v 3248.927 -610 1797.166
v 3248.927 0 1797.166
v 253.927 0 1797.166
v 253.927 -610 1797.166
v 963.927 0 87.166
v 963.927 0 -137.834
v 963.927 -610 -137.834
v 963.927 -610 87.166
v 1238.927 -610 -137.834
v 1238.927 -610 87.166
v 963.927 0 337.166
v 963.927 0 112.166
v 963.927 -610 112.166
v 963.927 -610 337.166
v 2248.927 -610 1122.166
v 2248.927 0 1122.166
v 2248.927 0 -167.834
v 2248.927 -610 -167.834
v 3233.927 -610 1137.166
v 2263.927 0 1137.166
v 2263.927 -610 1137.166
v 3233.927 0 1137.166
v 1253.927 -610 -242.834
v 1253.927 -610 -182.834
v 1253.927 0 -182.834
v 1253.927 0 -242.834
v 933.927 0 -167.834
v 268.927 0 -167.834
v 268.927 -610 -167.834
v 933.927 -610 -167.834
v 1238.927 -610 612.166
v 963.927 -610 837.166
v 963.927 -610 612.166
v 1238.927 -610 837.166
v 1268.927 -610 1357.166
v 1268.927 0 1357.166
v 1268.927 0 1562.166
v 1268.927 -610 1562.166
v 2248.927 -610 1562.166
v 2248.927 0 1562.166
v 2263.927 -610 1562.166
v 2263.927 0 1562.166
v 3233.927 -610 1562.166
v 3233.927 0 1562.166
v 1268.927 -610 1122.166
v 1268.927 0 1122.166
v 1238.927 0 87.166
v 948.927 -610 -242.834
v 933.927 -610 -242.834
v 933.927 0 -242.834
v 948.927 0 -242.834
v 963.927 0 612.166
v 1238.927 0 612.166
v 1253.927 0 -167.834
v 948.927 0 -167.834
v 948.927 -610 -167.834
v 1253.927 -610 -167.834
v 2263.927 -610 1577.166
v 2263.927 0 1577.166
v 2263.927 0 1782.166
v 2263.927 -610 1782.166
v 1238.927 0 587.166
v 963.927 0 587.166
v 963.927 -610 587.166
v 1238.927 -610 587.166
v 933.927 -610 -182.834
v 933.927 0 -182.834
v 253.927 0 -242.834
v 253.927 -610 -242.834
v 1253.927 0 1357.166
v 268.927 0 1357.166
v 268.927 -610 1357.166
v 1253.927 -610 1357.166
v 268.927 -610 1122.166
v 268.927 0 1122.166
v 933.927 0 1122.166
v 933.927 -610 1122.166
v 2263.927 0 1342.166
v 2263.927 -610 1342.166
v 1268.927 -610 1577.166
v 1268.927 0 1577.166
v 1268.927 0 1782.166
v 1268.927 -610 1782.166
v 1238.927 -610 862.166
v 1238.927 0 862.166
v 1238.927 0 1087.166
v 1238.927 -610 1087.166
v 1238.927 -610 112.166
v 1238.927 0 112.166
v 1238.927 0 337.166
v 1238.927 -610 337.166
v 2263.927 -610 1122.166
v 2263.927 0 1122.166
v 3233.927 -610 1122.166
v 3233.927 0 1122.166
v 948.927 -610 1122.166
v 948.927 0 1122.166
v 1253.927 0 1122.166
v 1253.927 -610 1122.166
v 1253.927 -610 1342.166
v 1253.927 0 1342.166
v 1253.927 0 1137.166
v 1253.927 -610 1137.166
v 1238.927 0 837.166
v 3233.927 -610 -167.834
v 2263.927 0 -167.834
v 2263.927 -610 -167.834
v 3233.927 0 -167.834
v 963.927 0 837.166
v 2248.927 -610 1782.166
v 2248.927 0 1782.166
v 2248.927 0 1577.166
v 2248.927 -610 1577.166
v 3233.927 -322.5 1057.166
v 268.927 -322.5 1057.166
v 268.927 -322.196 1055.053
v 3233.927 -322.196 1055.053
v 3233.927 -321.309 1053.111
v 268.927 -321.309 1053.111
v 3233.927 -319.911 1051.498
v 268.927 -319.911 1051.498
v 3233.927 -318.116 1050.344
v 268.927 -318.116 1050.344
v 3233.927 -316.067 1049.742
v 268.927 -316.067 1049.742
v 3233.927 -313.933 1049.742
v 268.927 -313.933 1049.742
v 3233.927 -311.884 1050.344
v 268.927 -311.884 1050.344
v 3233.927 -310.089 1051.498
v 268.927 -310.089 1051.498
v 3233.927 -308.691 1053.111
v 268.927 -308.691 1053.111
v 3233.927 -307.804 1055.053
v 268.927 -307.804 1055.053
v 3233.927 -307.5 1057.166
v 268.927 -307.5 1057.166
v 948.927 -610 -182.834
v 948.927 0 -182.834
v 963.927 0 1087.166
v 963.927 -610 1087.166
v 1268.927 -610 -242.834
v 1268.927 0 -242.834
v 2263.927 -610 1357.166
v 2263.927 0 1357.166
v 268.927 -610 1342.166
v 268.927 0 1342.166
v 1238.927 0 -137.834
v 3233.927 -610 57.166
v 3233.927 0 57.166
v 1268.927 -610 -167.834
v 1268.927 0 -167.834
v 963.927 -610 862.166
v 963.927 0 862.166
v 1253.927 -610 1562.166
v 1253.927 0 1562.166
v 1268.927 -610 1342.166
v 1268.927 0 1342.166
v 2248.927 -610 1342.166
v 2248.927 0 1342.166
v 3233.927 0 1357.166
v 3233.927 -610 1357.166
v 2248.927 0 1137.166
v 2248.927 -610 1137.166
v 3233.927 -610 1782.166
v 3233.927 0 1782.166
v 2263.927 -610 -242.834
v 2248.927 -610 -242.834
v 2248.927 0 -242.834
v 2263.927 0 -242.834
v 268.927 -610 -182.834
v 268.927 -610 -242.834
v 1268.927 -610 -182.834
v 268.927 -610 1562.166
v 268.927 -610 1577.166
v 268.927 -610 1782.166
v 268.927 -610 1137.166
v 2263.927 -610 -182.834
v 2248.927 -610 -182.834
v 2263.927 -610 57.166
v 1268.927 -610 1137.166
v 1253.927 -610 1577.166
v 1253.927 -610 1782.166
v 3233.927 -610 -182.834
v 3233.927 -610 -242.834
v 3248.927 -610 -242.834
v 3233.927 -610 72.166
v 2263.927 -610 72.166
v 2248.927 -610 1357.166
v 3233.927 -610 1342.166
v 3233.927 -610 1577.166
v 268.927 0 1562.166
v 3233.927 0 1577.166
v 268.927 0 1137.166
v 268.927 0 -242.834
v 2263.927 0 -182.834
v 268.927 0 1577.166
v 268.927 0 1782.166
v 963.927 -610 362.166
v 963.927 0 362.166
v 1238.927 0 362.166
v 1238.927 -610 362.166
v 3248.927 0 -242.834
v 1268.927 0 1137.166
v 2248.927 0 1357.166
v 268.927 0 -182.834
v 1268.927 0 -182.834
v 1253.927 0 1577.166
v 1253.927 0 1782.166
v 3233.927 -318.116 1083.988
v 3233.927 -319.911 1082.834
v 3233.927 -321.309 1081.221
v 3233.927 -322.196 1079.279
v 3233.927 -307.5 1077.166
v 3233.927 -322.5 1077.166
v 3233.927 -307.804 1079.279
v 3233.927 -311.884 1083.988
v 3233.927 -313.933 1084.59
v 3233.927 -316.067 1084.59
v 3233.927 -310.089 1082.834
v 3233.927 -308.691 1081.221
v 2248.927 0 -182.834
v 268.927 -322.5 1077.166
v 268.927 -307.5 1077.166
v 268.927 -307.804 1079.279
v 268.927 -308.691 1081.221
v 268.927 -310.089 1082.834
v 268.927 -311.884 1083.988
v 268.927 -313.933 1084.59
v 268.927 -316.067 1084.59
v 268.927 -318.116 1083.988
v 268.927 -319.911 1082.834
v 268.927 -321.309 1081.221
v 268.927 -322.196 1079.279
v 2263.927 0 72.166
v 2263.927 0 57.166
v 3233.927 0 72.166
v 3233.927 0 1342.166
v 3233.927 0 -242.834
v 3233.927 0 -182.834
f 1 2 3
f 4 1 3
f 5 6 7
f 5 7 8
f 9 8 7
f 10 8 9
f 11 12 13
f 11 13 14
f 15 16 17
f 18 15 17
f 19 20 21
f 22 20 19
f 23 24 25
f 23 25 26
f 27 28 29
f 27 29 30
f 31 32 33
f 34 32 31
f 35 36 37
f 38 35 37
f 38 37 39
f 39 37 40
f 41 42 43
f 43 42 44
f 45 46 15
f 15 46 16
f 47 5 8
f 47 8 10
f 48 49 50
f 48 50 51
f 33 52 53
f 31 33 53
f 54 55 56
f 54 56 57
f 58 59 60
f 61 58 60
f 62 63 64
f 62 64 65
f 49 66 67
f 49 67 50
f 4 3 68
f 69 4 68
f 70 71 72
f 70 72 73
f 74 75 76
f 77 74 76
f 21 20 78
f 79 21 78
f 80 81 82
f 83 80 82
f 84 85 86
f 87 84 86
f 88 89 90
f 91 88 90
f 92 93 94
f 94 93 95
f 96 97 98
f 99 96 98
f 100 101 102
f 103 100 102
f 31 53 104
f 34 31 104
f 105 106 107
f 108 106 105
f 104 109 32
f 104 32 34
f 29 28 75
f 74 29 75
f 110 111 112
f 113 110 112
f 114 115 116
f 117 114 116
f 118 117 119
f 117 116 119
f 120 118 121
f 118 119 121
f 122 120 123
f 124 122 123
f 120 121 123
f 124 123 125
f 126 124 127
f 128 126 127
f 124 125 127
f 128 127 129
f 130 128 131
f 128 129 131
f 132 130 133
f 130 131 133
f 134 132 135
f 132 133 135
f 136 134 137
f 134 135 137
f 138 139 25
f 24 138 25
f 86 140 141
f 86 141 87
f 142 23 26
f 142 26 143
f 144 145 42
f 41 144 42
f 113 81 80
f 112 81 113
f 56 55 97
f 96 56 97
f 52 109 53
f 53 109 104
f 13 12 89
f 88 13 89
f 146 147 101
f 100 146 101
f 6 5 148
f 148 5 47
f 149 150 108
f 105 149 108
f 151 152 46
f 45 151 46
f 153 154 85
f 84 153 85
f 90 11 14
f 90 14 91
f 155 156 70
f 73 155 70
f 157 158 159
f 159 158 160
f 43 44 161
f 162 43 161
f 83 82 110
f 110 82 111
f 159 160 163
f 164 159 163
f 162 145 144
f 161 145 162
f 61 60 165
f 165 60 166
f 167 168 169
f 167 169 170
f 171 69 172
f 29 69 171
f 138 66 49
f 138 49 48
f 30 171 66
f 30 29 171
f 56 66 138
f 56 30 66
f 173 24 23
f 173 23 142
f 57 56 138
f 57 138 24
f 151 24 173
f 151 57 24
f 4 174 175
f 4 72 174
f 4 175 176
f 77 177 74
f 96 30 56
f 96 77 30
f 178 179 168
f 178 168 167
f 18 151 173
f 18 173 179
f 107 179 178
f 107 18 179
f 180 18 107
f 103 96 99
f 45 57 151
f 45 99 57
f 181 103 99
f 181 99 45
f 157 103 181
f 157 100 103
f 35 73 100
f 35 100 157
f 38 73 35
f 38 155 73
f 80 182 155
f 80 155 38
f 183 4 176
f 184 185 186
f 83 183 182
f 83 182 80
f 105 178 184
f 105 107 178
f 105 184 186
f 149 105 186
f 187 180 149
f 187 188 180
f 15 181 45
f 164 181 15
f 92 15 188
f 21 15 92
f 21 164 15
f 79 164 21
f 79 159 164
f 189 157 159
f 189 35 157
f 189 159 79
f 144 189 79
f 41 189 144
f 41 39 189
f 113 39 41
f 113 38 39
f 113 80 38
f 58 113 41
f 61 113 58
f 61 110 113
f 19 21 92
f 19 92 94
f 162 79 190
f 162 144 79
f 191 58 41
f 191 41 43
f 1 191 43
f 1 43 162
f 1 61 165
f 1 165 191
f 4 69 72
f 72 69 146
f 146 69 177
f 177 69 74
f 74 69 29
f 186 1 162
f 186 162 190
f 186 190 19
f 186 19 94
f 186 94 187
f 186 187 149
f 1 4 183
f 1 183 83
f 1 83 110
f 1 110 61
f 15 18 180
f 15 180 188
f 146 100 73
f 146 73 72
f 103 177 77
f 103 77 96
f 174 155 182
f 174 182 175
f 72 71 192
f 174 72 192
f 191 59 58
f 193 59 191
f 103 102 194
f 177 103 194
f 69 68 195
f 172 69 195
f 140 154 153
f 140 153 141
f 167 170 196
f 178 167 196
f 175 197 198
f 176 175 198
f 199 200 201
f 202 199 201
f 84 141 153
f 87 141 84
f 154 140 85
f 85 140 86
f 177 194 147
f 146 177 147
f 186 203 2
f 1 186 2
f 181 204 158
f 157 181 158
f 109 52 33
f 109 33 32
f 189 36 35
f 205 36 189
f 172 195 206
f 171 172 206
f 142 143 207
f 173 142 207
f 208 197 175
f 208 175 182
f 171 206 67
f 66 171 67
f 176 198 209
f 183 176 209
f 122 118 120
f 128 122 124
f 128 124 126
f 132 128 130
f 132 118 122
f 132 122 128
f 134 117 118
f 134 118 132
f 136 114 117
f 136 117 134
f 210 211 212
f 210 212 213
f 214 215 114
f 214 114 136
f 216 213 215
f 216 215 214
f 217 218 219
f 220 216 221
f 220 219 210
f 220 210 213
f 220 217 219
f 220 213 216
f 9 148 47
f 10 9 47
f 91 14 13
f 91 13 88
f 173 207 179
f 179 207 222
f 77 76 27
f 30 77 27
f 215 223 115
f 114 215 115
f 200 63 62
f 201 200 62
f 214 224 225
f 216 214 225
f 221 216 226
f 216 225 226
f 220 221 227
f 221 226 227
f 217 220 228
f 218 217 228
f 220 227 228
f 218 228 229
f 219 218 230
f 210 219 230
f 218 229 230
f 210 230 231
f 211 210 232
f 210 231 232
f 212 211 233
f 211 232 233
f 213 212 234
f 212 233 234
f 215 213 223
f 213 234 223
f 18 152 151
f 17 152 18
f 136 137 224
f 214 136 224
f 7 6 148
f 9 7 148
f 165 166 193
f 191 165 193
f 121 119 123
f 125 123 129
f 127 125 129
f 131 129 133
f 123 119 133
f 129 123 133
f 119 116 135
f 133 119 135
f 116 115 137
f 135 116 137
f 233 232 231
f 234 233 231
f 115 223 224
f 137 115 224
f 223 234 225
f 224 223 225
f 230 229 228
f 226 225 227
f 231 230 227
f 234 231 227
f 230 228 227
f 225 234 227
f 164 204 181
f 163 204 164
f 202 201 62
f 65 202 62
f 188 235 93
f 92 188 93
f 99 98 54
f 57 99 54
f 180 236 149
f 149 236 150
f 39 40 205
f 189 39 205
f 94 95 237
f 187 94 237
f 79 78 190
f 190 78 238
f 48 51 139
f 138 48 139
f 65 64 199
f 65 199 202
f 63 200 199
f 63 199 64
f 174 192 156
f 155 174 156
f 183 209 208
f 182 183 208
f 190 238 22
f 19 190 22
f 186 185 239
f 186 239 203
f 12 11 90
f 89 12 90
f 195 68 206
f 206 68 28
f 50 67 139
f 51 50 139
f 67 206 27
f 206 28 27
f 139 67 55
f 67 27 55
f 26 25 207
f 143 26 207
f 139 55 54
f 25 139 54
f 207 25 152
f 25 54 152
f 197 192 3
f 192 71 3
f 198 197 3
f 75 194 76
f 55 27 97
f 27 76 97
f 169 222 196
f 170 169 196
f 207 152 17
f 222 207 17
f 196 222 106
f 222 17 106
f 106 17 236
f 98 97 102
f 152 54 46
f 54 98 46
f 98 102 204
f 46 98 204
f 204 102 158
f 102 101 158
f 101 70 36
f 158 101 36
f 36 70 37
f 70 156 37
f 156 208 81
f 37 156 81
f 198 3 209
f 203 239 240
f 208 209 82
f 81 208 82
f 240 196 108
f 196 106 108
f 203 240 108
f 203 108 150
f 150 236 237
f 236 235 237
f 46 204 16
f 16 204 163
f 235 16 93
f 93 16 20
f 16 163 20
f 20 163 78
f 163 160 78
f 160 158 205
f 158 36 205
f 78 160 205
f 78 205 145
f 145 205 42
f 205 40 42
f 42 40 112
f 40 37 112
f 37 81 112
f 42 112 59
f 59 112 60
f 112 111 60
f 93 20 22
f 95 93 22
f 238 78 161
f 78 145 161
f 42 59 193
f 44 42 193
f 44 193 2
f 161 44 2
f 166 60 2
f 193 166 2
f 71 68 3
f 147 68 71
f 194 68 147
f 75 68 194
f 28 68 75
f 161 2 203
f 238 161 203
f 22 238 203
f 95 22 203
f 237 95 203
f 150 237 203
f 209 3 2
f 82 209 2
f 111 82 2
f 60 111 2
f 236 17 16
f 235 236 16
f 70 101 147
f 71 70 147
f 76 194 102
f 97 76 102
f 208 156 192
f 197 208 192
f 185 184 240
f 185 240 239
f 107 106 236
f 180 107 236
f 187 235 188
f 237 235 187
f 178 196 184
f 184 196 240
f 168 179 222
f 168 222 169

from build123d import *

# Parameters (mm, degrees)
F0_W     = 985
F0_H     = 15
F0_W_2   = 665
F0_W_3   = 305
F0_W_4   = 980
F0_W_5   = 970
F1_DEPTH = 610
F3_DEPTH = 2965
F0_W_6   = 275
F0_H_2   = 225
F4_DEPTH = 610


with BuildPart() as f1:
    # F0 (on Front) → F1 (new body)
    with BuildSketch(Plane.XZ):
        Polygon((1268.9268333363, 1797.1661111622), (1253.9268333363, 1797.1661111622), (1253.9268333363, 1782.1661111622), (1253.9268333363, 1577.1661111622), (1253.9268333363, 1562.1661111622), (1253.9268333363, 1357.1661111622), (1253.9268333363, 1342.1661111622), (1253.9268333363, 1137.1661111622), (1253.9268333363, 1122.1661111622), (1253.9268333363, -167.8338888378), (1253.9268333363, -182.8338888378), (1253.9268333363, -242.8338888378), (1268.9268333363, -242.8338888378), (1268.9268333363, -182.8338888378), (1268.9268333363, -167.8338888378), (1268.9268333363, 1122.1661111622), (1268.9268333363, 1137.1661111622), (1268.9268333363, 1342.1661111622), (1268.9268333363, 1357.1661111622), (1268.9268333363, 1562.1661111622), (1268.9268333363, 1577.1661111622), (1268.9268333363, 1782.1661111622), align=None)
        Polygon((268.9268333363, 1797.1661111622), (253.9268333363, 1797.1661111622), (253.9268333363, -242.8338888378), (268.9268333363, -242.8338888378), (268.9268333363, -182.8338888378), (268.9268333363, -167.8338888378), (268.9268333363, 1122.1661111622), (268.9268333363, 1137.1661111622), (268.9268333363, 1342.1661111622), (268.9268333363, 1357.1661111622), (268.9268333363, 1562.1661111622), (268.9268333363, 1577.1661111622), (268.9268333363, 1782.1661111622), align=None)
        Polygon((933.9268333363, -167.8338888378), (933.9268333363, -182.8338888378), (933.9268333363, -242.8338888378), (948.9268333363, -242.8338888378), (948.9268333363, -182.8338888378), (948.9268333363, -167.8338888378), (948.9268333363, 1122.1661111622), (933.9268333363, 1122.1661111622), align=None)
        with Locations((761.4268333363, 1789.6661111622)):
            Rectangle(F0_W, F0_H)
        with Locations((761.4268333363, 1569.6661111622)):
            Rectangle(F0_W, F0_H)
        with Locations((761.4268333363, 1349.6661111622)):
            Rectangle(F0_W, F0_H)
        Polygon((268.9268333363, 1137.1661111622), (268.9268333363, 1122.1661111622), (933.9268333363, 1122.1661111622), (948.9268333363, 1122.1661111622), (1253.9268333363, 1122.1661111622), (1253.9268333363, 1137.1661111622), align=None)
        with Locations((601.4268333363, -175.3338888378)):
            Rectangle(F0_W_2, F0_H)
        with Locations((1101.4268333363, -175.3338888378)):
            Rectangle(F0_W_3, F0_H)
        with Locations((1758.9268333363, 1789.6661111622)):
            Rectangle(F0_W_4, F0_H)
        with Locations((2748.9268333363, 1789.6661111622)):
            Rectangle(F0_W_5, F0_H)
        with Locations((1758.9268333363, 1569.6661111622)):
            Rectangle(F0_W_4, F0_H)
        with Locations((2748.9268333363, 1569.6661111622)):
            Rectangle(F0_W_5, F0_H)
        with Locations((2748.9268333363, 1349.6661111622)):
            Rectangle(F0_W_5, F0_H)
        with Locations((1758.9268333363, 1349.6661111622)):
            Rectangle(F0_W_4, F0_H)
        with Locations((1758.9268333363, 1129.6661111622)):
            Rectangle(F0_W_4, F0_H)
        with Locations((2748.9268333363, 1129.6661111622)):
            Rectangle(F0_W_5, F0_H)
        Polygon((2263.9268333363, 1797.1661111622), (2248.9268333363, 1797.1661111622), (2248.9268333363, 1782.1661111622), (2248.9268333363, 1577.1661111622), (2248.9268333363, 1562.1661111622), (2248.9268333363, 1357.1661111622), (2248.9268333363, 1342.1661111622), (2248.9268333363, 1137.1661111622), (2248.9268333363, 1122.1661111622), (2248.9268333363, -167.8338888378), (2248.9268333363, -182.8338888378), (2248.9268333363, -242.8338888378), (2263.9268333363, -242.8338888378), (2263.9268333363, -182.8338888378), (2263.9268333363, -167.8338888378), (2263.9268333363, 57.1661111622), (2263.9268333363, 72.1661111622), (2263.9268333363, 1122.1661111622), (2263.9268333363, 1137.1661111622), (2263.9268333363, 1342.1661111622), (2263.9268333363, 1357.1661111622), (2263.9268333363, 1562.1661111622), (2263.9268333363, 1577.1661111622), (2263.9268333363, 1782.1661111622), align=None)
        Polygon((3248.9268333363, 1797.1661111622), (3233.9268333363, 1797.1661111622), (3233.9268333363, 1782.1661111622), (3233.9268333363, 1577.1661111622), (3233.9268333363, 1562.1661111622), (3233.9268333363, 1357.1661111622), (3233.9268333363, 1342.1661111622), (3233.9268333363, 1137.1661111622), (3233.9268333363, 1122.1661111622), (3233.9268333363, 72.1661111622), (3233.9268333363, 57.1661111622), (3233.9268333363, -167.8338888378), (3233.9268333363, -182.8338888378), (3233.9268333363, -242.8338888378), (3248.9268333363, -242.8338888378), align=None)
        with Locations((2748.9268333363, -175.3338888378)):
            Rectangle(F0_W_5, F0_H)
        with Locations((1758.9268333363, -175.3338888378)):
            Rectangle(F0_W_4, F0_H)
        with Locations((2748.9268333363, 64.6661111622)):
            Rectangle(F0_W_5, F0_H)
    extrude(amount=F1_DEPTH)


with BuildPart() as f3:
    # F2 (on face) → F3 (new body, through all)
    with BuildSketch(Plane.YZ.offset(268.9268333363)):
        with BuildLine():
            Line((-322.5, 1077.1661111622), (-322.5, 1057.1661111622))
            ThreePointArc((-322.5, 1057.1661111622), (-315, 1049.6661111622), (-307.5, 1057.1661111622))
            Line((-307.5, 1057.1661111622), (-307.5, 1077.1661111622))
            ThreePointArc((-307.5, 1077.1661111622), (-315, 1084.6661111622), (-322.5, 1077.1661111622))
        make_face()
    extrude(amount=F3_DEPTH)


with BuildPart() as f4:
    # F0 (on Front) → F4 (new body)
    with BuildSketch(Plane.XZ):
        with Locations((1101.4268333363, 974.6661111622)):
            Rectangle(F0_W_6, F0_H_2)
    extrude(amount=F4_DEPTH)


with BuildPart() as f4b:
    # F0 (on Front) → F4, piece 2 (new body)
    with BuildSketch(Plane.XZ):
        with Locations((1101.4268333363, 724.6661111622)):
            Rectangle(F0_W_6, F0_H_2)
    extrude(amount=F4_DEPTH)


with BuildPart() as f4c:
    # F0 (on Front) → F4, piece 3 (new body)
    with BuildSketch(Plane.XZ):
        with Locations((1101.4268333363, 474.6661111622)):
            Rectangle(F0_W_6, F0_H_2)
    extrude(amount=F4_DEPTH)


with BuildPart() as f4d:
    # F0 (on Front) → F4, piece 4 (new body)
    with BuildSketch(Plane.XZ):
        with Locations((1101.4268333363, 224.6661111622)):
            Rectangle(F0_W_6, F0_H_2)
    extrude(amount=F4_DEPTH)


with BuildPart() as f4e:
    # F0 (on Front) → F4, piece 5 (new body)
    with BuildSketch(Plane.XZ):
        with Locations((1101.4268333363, -25.3338888378)):
            Rectangle(F0_W_6, F0_H_2)
    extrude(amount=F4_DEPTH)


solid = Compound([f1.part, f3.part, f4.part, f4b.part, f4c.part, f4d.part, f4e.part])
